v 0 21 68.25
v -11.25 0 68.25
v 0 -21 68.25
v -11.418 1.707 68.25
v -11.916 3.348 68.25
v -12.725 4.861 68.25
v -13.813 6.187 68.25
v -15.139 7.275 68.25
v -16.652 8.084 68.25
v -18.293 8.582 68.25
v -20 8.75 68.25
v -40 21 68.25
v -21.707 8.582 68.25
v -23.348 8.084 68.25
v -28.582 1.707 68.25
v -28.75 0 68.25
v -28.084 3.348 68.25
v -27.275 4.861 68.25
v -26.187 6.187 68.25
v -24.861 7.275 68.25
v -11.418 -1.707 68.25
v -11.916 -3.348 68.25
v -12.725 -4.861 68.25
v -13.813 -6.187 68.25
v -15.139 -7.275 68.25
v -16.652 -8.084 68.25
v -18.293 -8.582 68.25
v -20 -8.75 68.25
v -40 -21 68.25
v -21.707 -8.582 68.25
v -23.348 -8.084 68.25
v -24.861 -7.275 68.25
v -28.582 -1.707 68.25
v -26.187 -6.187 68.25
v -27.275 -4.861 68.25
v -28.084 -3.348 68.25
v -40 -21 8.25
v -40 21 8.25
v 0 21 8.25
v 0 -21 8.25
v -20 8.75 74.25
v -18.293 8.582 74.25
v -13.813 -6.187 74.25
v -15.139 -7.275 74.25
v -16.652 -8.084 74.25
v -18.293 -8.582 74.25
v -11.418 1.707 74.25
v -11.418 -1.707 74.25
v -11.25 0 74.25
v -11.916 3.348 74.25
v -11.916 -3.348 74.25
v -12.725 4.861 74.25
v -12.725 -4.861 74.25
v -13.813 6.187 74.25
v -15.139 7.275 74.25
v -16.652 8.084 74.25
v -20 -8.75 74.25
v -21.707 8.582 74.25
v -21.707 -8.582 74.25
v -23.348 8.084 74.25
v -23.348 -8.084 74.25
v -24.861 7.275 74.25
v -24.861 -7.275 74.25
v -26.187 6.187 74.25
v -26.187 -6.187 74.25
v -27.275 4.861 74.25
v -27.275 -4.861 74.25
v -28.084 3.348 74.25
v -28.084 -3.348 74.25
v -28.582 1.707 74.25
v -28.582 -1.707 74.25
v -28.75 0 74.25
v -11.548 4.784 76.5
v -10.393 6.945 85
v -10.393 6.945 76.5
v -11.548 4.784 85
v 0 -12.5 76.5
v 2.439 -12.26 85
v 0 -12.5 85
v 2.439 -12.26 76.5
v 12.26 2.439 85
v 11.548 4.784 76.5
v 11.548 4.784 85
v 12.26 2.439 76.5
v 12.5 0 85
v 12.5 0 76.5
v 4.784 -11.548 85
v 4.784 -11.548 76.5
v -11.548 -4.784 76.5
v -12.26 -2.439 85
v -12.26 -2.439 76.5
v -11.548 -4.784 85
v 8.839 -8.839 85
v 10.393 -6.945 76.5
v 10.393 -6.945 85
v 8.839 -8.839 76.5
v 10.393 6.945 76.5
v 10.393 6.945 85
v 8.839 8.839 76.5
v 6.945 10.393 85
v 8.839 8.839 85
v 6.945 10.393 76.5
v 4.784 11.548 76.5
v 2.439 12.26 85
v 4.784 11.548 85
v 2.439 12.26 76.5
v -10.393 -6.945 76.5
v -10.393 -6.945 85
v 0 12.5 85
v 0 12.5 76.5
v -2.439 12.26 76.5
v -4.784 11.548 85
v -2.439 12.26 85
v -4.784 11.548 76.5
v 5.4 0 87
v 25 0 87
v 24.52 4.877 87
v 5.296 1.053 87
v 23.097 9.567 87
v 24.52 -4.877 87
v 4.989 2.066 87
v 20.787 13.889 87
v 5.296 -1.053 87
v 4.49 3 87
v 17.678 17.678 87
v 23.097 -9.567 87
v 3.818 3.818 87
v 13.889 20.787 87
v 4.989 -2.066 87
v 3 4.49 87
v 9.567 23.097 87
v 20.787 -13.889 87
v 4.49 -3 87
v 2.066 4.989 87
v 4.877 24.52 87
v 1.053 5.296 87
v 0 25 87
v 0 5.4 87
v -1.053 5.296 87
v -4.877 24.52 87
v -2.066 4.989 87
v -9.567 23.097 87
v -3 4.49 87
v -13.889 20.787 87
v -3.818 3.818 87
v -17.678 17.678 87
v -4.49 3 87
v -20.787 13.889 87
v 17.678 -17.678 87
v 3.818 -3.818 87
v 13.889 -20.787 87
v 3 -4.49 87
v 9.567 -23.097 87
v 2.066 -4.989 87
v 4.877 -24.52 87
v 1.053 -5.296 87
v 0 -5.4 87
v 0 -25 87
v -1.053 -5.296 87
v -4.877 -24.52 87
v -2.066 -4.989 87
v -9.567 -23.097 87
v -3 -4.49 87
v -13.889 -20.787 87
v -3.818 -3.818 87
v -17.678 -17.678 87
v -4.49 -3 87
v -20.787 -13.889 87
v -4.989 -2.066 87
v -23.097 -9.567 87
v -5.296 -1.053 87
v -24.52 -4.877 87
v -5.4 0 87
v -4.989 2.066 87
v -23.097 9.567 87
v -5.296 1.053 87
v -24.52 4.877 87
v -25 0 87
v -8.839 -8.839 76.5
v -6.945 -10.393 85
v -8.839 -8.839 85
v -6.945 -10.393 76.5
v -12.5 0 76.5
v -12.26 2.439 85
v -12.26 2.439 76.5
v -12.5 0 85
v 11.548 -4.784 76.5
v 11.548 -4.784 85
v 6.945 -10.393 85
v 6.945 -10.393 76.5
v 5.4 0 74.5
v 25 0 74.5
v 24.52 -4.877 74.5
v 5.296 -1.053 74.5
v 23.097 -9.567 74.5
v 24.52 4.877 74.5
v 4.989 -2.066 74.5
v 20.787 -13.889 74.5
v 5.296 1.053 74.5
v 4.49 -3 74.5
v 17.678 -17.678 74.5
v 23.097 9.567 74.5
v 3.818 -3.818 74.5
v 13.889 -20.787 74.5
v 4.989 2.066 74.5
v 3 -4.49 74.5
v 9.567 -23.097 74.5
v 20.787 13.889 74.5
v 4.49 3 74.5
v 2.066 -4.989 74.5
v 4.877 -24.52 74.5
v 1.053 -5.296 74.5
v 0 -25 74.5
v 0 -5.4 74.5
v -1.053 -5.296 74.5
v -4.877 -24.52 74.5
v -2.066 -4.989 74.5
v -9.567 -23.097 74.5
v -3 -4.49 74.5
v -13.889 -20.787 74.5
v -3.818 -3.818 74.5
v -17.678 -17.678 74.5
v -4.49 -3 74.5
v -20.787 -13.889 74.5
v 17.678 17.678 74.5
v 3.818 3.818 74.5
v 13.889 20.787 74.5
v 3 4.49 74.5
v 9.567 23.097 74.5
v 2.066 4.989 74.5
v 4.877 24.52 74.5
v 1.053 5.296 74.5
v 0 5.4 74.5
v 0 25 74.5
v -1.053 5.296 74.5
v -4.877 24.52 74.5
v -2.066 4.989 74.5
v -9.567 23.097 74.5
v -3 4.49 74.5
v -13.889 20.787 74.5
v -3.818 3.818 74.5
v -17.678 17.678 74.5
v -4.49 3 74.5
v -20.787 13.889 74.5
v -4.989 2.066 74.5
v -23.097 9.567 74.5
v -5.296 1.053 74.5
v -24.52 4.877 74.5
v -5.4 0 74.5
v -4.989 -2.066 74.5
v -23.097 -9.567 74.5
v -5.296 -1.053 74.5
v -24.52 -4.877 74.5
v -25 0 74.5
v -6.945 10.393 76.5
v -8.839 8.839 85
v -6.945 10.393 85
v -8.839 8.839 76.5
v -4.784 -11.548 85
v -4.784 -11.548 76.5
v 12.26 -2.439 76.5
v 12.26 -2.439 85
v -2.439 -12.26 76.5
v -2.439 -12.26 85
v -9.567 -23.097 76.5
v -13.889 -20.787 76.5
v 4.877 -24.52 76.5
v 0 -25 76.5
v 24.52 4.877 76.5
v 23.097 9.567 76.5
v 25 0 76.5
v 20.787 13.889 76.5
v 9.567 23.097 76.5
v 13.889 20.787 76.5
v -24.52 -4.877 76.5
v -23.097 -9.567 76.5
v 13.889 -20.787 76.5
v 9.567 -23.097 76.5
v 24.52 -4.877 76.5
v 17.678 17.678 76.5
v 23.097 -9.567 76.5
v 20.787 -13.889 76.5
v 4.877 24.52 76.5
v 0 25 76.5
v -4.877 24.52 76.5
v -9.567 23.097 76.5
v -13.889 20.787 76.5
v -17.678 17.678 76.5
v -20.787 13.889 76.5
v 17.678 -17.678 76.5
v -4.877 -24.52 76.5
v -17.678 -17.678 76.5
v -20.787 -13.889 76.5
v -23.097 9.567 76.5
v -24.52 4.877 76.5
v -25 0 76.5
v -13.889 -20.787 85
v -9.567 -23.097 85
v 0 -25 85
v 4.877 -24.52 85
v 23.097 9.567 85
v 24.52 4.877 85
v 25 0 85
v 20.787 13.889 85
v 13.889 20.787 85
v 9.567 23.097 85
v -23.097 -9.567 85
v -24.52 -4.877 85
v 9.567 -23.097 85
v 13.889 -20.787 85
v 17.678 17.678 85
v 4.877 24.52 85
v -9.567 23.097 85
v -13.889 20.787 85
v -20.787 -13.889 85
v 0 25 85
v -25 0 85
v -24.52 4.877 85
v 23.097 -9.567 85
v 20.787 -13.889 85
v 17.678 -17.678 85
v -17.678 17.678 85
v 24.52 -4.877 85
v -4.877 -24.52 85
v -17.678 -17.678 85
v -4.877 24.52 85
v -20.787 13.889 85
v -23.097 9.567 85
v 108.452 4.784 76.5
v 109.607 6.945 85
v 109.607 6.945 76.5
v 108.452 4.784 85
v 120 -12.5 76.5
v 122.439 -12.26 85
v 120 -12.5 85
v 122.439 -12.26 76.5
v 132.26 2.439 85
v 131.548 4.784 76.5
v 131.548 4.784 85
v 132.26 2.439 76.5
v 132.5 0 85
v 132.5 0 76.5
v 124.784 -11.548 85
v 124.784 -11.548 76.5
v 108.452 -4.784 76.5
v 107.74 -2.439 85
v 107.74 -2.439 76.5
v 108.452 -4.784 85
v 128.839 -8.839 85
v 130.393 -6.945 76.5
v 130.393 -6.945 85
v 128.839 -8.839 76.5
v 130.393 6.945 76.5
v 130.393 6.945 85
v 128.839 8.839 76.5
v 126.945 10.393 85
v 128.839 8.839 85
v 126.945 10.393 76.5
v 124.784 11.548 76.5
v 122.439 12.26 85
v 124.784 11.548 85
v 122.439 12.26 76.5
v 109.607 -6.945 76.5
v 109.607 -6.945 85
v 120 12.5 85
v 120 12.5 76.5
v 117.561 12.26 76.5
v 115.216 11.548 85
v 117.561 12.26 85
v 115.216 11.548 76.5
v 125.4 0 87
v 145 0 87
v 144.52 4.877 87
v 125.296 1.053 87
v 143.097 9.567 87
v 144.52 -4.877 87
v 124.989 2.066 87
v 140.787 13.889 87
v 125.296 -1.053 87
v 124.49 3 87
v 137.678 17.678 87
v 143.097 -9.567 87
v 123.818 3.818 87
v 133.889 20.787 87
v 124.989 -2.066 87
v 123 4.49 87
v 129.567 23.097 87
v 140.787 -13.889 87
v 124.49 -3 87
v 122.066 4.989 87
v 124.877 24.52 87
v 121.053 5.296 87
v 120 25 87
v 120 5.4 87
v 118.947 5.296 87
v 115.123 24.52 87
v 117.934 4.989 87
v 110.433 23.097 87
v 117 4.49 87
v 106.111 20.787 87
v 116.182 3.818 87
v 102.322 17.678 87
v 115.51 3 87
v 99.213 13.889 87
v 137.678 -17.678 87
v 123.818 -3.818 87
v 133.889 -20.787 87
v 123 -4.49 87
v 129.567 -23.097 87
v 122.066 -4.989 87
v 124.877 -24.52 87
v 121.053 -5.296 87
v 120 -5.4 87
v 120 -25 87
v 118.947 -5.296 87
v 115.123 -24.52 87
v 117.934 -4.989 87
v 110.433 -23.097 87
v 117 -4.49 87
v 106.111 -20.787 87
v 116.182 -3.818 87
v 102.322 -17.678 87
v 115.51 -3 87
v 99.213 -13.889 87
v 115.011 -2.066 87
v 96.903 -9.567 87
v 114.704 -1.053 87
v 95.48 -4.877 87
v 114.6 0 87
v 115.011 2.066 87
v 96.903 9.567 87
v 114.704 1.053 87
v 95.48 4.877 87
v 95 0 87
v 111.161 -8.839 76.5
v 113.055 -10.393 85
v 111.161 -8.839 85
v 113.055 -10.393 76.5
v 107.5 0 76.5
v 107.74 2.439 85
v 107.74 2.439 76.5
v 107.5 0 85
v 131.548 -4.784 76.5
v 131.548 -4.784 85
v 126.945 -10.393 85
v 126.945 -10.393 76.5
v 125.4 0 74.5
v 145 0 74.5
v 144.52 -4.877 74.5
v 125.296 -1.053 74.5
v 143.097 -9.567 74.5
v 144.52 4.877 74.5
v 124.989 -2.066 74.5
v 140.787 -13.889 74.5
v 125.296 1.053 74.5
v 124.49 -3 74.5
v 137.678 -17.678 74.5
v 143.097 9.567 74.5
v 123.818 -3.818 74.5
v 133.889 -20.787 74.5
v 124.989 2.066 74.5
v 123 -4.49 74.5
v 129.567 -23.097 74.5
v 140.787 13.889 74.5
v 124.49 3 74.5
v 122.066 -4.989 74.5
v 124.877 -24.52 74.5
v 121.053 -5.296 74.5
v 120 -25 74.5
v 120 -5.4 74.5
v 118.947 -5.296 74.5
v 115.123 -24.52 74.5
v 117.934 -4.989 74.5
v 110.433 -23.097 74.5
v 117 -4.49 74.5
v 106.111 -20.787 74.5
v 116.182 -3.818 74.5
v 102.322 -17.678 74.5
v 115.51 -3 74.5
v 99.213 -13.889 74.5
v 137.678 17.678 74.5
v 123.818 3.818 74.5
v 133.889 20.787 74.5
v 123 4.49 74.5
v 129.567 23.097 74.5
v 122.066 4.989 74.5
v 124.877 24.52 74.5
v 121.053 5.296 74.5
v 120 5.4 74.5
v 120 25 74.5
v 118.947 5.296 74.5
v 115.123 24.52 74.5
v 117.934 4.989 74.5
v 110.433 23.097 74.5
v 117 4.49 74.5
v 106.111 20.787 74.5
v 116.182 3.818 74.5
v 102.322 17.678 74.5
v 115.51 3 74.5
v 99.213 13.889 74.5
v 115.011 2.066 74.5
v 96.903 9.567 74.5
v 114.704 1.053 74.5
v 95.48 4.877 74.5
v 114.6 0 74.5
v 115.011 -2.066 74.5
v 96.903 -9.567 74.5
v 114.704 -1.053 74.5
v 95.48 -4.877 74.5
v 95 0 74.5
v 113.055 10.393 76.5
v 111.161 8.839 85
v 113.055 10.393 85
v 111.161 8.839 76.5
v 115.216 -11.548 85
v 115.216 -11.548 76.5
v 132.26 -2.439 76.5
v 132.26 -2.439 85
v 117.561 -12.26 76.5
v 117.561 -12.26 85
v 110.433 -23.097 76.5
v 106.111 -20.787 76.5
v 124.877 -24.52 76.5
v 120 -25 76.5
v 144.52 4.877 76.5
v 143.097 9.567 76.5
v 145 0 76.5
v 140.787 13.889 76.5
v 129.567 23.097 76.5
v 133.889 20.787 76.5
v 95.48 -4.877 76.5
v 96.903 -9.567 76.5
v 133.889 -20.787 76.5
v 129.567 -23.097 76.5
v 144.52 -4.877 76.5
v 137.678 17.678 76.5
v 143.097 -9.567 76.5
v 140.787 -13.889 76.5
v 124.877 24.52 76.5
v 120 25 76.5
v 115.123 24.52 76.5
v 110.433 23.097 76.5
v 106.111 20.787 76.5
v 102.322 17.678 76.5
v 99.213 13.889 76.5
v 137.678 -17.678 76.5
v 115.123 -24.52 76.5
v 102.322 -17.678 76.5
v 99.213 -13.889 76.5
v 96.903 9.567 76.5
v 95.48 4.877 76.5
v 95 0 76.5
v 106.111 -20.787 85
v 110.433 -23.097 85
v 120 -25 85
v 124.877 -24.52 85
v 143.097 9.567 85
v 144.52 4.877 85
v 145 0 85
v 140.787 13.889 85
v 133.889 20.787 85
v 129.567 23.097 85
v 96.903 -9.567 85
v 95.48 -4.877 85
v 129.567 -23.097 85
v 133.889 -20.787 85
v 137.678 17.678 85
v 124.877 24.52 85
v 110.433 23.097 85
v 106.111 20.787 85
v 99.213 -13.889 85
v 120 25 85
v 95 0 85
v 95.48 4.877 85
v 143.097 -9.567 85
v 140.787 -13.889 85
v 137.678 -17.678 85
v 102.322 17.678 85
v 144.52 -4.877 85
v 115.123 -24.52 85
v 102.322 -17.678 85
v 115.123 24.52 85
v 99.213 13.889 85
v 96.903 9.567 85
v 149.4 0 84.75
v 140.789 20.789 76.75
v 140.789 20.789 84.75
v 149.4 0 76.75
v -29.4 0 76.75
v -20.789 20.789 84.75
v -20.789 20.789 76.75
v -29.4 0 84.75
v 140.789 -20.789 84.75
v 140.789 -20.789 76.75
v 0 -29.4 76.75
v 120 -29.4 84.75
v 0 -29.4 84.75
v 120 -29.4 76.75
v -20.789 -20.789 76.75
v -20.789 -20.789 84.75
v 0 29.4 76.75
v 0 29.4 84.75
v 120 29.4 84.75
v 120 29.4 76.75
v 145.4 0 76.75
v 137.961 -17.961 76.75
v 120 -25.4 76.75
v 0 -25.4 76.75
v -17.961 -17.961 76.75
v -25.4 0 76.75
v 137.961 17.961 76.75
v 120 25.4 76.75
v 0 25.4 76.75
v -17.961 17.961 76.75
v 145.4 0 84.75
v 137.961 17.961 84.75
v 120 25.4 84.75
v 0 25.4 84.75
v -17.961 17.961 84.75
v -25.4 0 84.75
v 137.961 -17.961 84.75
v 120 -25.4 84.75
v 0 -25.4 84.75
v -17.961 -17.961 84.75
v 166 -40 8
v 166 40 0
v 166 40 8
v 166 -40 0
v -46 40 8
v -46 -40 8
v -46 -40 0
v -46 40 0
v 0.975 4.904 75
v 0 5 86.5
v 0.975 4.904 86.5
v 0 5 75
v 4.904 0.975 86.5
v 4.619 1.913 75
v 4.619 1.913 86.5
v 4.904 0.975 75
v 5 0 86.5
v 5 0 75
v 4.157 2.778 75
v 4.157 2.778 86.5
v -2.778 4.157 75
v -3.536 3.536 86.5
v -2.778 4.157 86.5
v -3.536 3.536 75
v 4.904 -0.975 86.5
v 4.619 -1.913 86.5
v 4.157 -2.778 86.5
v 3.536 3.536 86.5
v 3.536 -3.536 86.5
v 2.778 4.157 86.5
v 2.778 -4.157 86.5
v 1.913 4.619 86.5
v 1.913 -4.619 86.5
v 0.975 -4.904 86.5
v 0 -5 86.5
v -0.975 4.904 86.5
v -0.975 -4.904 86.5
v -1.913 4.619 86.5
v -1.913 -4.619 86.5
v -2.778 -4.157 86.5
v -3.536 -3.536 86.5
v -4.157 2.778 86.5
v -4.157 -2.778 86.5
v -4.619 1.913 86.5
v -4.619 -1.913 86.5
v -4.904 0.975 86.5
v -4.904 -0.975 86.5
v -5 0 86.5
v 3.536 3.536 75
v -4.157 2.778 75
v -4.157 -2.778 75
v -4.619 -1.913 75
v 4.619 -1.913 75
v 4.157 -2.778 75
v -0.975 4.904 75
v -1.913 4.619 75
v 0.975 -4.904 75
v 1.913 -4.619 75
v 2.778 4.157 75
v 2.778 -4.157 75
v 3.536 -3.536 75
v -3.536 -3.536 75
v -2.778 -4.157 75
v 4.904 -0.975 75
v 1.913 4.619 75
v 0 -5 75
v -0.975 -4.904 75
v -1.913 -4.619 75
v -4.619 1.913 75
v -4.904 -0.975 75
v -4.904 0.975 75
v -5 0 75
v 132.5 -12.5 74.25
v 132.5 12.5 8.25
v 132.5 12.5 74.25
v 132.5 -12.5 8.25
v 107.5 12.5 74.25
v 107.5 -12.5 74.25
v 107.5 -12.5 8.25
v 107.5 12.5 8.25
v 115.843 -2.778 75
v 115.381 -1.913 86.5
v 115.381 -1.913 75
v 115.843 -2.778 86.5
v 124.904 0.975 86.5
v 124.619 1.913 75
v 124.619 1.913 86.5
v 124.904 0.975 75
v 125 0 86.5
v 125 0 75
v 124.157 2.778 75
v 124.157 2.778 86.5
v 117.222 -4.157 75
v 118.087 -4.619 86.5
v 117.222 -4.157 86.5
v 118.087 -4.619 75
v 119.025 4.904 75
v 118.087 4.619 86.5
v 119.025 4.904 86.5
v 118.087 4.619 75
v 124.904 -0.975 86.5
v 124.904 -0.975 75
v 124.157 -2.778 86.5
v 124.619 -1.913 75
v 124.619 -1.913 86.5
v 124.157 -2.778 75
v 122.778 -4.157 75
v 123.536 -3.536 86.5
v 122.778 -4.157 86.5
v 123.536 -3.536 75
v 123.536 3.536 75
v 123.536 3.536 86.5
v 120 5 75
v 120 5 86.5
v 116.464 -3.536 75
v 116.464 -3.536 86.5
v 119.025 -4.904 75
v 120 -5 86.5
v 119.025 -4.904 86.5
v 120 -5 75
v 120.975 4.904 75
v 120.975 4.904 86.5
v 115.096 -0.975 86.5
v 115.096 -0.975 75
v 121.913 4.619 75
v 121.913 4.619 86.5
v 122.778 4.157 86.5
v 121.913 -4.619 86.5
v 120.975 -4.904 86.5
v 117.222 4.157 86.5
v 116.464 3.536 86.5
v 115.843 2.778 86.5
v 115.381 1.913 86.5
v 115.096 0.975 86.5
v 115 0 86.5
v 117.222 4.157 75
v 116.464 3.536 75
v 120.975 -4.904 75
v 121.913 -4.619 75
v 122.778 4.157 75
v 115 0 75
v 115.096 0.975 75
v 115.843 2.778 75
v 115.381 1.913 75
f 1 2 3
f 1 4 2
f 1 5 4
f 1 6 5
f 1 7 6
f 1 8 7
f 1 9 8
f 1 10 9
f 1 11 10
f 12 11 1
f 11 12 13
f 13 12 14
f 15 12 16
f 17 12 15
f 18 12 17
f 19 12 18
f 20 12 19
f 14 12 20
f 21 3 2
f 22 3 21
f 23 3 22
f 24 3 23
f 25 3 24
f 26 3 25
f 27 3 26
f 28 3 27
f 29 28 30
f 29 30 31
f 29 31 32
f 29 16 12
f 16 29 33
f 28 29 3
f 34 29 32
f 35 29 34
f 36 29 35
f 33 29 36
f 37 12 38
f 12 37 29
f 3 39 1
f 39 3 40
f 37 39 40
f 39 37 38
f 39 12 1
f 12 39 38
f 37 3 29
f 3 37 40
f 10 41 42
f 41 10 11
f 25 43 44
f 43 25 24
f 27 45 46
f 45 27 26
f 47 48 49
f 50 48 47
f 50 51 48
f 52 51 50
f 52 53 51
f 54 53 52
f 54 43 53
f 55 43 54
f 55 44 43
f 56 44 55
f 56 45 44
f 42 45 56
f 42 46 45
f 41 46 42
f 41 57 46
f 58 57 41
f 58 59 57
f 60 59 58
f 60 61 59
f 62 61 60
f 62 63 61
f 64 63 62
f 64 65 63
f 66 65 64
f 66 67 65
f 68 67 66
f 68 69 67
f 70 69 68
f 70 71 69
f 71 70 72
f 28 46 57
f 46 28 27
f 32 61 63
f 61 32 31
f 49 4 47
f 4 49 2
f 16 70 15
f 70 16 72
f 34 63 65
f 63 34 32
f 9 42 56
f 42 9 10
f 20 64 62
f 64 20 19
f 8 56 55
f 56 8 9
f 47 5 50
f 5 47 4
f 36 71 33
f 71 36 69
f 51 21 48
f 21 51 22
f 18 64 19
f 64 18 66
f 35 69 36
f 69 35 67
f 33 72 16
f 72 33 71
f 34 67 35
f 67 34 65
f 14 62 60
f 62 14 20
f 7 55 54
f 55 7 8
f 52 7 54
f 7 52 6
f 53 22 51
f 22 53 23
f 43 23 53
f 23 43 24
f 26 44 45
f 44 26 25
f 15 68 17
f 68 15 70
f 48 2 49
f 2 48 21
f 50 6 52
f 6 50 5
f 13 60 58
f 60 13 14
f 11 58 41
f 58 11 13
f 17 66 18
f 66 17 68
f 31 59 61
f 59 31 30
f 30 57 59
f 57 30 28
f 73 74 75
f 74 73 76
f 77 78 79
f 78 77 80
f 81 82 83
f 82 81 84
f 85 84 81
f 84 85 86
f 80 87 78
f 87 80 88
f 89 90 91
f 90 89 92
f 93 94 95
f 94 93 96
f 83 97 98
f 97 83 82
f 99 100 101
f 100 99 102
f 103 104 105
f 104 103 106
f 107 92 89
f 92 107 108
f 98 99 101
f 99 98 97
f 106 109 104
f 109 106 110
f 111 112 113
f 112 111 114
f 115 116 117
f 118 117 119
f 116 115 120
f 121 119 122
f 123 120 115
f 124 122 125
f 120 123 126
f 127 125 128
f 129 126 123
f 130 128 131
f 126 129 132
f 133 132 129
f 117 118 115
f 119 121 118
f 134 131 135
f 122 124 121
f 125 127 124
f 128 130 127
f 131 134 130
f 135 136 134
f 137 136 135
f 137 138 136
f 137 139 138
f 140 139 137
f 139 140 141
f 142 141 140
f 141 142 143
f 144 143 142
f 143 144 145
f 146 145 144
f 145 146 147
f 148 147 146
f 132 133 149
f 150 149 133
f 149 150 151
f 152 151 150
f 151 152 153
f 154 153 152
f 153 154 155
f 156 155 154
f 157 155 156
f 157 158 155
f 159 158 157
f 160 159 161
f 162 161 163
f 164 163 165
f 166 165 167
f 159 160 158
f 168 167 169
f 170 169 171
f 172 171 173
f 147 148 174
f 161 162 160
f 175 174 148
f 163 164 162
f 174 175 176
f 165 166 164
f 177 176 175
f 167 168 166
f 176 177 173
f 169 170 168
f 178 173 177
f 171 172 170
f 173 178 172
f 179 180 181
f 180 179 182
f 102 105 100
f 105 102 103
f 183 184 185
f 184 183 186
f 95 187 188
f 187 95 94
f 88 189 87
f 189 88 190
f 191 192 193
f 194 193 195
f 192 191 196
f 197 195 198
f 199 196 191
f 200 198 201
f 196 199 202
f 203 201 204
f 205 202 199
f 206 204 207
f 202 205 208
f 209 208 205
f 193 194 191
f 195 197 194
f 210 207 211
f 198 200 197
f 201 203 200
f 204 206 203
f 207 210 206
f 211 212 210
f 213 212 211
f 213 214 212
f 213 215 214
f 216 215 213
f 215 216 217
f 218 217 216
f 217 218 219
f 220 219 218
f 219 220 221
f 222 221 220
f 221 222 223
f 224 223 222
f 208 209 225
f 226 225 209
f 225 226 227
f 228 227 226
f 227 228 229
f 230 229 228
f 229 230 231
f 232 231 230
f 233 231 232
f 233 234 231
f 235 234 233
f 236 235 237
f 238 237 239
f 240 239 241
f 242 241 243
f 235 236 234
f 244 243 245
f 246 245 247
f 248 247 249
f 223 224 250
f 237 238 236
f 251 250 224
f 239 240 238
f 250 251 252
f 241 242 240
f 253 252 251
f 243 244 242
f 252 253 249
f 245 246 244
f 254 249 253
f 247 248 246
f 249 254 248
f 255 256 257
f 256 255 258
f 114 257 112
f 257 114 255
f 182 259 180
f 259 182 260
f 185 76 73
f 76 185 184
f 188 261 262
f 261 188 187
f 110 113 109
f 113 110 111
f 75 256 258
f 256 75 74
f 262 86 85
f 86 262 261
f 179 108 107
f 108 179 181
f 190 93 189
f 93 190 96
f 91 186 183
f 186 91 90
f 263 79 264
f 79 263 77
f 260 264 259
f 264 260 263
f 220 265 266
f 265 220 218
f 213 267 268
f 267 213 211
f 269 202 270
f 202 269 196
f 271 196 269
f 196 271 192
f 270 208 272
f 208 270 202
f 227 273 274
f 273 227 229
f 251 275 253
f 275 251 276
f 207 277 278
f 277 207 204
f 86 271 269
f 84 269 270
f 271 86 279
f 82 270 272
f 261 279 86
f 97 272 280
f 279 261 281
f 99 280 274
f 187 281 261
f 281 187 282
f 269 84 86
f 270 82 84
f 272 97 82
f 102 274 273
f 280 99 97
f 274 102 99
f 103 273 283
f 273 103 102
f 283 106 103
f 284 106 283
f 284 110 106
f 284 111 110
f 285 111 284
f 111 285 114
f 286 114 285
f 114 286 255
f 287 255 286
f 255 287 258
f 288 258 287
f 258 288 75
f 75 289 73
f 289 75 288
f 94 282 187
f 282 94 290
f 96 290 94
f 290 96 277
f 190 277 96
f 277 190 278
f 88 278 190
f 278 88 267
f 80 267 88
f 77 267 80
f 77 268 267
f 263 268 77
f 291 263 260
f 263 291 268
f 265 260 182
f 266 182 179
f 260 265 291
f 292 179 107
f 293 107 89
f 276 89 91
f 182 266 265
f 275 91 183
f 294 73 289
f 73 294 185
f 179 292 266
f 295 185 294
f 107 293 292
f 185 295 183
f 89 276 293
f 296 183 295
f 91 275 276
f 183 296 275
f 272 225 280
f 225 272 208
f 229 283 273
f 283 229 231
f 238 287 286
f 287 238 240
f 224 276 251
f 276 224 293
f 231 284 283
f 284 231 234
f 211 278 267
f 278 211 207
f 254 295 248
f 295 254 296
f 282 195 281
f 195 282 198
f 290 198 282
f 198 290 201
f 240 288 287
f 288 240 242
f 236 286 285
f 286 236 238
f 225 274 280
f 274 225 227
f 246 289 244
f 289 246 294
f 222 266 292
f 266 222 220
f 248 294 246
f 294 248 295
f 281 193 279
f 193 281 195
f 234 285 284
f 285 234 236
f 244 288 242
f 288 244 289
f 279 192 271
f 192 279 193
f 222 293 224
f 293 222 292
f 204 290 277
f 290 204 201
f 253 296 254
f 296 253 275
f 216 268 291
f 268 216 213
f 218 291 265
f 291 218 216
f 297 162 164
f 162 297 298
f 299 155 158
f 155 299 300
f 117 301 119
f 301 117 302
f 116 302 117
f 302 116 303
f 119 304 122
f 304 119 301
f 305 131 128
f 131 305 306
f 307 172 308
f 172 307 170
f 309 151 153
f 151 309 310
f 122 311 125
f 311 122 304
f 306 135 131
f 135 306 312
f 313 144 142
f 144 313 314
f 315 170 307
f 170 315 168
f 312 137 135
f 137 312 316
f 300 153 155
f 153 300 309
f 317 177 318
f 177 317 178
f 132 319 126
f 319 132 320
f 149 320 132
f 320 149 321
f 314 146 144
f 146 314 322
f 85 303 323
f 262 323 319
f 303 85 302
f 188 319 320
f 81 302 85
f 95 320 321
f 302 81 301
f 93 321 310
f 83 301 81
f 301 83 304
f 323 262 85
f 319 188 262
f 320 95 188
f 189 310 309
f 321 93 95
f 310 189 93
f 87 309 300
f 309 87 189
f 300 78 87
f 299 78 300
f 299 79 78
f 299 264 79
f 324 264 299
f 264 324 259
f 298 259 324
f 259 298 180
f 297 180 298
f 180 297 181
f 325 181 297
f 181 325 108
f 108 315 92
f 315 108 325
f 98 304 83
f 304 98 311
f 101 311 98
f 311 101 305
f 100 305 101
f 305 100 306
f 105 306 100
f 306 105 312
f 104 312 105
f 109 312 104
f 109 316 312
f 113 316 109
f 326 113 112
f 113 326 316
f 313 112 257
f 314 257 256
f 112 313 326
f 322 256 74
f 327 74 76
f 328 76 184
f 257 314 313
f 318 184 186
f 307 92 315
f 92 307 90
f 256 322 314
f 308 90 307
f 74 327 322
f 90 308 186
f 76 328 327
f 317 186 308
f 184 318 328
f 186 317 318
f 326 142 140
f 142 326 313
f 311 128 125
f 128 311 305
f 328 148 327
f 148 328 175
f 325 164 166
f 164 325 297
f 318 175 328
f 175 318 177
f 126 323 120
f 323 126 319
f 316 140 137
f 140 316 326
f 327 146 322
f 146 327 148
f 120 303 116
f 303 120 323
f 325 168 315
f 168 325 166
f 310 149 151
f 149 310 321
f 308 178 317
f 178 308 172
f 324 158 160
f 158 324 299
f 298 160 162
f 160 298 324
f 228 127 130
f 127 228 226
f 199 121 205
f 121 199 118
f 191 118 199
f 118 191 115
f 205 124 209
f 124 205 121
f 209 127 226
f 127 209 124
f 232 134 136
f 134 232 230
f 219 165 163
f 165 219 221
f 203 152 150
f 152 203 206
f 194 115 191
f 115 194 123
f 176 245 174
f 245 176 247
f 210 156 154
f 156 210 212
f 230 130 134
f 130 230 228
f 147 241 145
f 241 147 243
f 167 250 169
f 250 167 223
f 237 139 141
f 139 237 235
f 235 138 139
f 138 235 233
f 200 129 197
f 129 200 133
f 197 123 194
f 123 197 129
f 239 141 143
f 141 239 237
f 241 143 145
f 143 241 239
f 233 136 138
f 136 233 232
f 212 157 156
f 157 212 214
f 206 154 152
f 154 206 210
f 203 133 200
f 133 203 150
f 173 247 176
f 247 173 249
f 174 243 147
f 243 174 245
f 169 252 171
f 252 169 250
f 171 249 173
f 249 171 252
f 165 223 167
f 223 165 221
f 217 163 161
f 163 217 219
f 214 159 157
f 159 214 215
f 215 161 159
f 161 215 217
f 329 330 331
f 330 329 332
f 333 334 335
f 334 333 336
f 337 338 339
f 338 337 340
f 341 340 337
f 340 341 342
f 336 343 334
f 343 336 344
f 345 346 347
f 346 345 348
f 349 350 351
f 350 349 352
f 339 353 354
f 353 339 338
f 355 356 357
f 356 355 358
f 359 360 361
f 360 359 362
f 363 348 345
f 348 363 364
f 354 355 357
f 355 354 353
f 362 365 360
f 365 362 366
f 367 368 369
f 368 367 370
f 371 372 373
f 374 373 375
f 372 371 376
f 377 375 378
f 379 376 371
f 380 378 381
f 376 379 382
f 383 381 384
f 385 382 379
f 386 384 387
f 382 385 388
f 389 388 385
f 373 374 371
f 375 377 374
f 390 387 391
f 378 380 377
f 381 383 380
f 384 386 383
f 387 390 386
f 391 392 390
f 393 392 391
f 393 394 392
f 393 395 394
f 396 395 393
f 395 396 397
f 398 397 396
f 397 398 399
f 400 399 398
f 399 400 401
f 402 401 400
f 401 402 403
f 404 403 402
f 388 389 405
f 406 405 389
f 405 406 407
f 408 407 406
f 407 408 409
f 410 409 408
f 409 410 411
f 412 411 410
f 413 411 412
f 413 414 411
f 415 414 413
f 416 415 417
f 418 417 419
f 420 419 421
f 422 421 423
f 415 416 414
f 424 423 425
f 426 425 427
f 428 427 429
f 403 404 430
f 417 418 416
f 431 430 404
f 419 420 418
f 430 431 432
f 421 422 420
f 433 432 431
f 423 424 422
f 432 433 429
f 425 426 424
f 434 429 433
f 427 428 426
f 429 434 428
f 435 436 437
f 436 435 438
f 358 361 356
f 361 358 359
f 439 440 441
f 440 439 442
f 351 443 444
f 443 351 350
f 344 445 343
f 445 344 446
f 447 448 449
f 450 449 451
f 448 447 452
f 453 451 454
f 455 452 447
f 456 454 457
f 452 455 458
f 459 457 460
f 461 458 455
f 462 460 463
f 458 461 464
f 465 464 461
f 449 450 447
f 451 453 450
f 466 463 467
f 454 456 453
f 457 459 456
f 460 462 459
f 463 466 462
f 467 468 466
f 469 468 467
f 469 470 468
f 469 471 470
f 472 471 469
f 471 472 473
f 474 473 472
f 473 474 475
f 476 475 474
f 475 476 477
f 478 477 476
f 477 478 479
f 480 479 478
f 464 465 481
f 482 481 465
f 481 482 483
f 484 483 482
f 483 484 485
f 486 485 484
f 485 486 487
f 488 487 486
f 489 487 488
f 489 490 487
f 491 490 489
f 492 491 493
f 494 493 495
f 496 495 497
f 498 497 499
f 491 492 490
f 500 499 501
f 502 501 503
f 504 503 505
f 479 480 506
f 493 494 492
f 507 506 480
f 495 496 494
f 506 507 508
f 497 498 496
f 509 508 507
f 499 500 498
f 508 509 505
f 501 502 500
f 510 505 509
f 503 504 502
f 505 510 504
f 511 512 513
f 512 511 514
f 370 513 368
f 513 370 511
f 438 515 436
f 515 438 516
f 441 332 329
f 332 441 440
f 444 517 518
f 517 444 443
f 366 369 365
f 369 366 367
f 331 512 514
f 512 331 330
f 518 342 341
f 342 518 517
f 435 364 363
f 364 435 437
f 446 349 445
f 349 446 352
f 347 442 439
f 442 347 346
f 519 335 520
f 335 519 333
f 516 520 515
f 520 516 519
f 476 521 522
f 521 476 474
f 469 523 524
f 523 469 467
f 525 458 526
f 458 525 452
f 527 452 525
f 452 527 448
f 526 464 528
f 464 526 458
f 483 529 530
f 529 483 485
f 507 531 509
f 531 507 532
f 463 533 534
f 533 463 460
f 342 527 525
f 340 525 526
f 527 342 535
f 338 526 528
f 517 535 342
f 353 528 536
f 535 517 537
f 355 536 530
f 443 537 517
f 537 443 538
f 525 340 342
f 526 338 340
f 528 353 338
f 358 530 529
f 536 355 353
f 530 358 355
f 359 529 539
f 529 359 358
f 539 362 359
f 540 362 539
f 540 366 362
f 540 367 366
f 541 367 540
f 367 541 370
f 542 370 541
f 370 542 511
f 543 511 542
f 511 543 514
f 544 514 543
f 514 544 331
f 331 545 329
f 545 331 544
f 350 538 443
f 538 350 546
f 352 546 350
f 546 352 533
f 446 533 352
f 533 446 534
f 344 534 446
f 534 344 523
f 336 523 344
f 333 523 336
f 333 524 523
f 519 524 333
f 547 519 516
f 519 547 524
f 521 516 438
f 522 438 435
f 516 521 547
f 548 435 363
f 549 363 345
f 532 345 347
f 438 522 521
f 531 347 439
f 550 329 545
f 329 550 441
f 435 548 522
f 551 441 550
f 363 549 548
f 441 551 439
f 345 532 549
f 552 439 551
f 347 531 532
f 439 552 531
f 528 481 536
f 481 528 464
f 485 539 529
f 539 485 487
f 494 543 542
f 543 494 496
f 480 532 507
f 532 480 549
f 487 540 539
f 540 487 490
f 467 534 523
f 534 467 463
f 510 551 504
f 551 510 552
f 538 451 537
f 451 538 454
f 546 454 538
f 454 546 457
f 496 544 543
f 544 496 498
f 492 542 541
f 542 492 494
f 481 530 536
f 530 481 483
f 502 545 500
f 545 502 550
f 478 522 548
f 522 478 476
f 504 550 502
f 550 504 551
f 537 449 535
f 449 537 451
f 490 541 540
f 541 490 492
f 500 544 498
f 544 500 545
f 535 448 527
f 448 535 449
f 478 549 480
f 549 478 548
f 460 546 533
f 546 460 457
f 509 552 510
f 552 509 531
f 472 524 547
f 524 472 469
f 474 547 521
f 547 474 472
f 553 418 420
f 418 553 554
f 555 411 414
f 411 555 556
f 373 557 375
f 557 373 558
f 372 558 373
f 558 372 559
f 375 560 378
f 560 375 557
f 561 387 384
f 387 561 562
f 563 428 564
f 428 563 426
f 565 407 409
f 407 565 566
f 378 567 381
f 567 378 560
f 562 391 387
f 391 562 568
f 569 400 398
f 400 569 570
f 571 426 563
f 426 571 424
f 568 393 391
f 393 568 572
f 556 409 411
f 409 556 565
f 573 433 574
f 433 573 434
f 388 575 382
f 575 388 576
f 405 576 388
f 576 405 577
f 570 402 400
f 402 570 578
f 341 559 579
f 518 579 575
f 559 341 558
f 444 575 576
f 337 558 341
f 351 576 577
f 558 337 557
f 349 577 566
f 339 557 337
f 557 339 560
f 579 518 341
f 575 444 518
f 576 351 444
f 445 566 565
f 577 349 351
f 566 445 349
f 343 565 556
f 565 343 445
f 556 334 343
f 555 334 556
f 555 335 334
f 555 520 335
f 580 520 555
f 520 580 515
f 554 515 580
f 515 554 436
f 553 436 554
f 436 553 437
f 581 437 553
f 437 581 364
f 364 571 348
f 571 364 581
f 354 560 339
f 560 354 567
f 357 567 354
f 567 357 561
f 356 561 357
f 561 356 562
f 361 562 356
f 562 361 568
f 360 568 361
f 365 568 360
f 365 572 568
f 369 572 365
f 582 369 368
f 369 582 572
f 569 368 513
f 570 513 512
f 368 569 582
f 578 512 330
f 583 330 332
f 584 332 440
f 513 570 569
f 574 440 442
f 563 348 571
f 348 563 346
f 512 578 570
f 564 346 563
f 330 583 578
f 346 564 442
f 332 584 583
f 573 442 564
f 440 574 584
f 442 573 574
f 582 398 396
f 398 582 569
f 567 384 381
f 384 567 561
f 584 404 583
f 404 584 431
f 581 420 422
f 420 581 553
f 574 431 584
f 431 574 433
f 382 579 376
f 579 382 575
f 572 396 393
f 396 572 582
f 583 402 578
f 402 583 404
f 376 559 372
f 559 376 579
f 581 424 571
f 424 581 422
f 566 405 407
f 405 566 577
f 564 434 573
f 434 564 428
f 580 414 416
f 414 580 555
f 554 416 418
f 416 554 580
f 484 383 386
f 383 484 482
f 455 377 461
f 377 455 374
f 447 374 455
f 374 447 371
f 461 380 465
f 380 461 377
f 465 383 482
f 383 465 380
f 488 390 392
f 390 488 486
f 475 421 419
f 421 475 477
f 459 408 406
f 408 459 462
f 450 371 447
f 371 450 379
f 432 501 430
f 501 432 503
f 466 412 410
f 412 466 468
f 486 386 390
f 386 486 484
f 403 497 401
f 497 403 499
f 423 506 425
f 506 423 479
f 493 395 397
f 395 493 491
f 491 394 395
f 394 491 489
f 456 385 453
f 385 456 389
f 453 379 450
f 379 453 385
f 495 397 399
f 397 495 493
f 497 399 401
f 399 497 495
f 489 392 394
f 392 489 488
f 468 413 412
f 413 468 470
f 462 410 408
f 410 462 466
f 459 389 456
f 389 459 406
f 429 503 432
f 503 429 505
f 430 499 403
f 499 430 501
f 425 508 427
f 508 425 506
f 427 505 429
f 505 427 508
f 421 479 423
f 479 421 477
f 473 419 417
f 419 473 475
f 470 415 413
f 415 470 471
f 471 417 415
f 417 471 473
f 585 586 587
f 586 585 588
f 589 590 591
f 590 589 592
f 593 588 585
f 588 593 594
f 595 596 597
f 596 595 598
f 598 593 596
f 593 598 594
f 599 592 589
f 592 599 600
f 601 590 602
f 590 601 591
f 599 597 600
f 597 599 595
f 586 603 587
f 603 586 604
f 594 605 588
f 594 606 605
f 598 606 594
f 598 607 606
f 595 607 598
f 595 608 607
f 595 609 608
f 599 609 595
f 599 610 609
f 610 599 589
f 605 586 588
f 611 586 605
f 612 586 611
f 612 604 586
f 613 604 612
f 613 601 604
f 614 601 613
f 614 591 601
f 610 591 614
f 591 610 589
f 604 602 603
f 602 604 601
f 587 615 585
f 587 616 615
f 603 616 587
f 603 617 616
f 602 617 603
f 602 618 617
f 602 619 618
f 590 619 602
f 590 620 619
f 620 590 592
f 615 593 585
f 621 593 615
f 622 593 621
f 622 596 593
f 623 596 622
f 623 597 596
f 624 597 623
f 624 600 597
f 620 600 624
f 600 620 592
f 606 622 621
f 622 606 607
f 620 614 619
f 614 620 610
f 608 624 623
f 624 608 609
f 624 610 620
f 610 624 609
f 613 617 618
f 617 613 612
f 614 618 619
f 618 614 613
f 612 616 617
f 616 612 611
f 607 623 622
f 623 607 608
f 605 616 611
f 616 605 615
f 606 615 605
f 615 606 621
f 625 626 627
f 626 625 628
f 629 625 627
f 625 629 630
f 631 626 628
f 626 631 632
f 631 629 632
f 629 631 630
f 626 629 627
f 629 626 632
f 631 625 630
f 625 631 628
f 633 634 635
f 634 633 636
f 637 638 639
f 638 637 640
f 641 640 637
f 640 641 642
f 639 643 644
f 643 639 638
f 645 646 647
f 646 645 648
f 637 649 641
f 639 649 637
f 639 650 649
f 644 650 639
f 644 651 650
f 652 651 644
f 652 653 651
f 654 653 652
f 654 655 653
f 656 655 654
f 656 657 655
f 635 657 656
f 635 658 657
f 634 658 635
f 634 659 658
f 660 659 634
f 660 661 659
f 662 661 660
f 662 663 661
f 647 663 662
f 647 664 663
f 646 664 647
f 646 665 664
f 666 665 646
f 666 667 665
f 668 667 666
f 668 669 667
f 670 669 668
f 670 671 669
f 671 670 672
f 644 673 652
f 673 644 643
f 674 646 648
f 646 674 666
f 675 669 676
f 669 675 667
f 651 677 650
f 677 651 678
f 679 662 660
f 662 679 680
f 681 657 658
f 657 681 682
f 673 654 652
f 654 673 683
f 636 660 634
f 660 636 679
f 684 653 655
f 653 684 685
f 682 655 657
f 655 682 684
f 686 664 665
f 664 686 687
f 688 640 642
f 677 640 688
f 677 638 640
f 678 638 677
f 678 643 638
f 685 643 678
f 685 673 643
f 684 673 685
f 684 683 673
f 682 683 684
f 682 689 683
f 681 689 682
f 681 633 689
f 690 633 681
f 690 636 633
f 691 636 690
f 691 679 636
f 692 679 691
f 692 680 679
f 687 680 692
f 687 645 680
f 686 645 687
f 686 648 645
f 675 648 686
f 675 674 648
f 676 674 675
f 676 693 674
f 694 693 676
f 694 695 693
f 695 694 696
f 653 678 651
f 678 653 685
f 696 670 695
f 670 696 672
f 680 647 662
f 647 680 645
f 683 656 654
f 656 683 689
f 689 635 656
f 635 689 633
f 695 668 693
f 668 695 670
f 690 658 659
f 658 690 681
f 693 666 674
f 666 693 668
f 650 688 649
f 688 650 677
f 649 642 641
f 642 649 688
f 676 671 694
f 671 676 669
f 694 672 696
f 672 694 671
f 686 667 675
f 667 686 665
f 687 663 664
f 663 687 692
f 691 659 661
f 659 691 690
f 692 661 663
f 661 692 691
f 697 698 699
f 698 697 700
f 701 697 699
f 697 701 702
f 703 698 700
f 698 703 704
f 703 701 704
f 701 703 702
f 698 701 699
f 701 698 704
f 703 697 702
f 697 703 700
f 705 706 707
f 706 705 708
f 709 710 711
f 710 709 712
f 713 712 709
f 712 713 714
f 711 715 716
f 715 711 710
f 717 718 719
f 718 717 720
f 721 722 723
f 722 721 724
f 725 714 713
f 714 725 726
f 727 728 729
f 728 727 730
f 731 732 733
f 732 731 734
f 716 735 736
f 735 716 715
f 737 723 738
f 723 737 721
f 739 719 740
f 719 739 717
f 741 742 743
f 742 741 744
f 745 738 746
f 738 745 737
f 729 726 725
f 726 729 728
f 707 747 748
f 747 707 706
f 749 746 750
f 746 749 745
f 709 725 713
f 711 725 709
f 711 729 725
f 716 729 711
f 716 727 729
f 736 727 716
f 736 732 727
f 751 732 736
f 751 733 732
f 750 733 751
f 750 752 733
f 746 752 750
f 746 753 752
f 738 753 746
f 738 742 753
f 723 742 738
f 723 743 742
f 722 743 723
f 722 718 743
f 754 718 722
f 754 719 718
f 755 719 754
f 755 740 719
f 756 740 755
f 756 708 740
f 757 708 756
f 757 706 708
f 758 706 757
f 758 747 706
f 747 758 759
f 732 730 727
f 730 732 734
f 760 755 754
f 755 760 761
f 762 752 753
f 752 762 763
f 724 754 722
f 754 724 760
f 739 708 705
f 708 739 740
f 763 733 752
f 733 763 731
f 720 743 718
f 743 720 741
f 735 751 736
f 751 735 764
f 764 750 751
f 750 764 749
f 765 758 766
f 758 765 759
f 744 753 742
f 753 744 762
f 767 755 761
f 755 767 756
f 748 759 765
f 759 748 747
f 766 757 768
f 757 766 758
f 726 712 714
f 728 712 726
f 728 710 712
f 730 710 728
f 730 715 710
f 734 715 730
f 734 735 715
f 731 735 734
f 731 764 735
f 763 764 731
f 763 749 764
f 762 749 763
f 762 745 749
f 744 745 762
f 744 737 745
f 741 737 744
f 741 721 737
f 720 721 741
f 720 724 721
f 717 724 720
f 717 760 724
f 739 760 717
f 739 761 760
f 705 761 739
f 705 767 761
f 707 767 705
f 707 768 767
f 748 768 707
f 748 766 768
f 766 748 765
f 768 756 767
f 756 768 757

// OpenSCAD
$fn = 32;

// ------------------------------------------------------------------------
// Motor belt drive: span 120 mm, pulleys d50, belt 8 mm wide
// Every part is its own module, assembly() places every instance.
// ------------------------------------------------------------------------

// --- part 1 ---
module base_plate() {
  difference() {
    translate([-106, -40, 0]) cube([212, 80, 8]);
  }
}

// --- part 2 ---
module motor() {
  union() {
    translate([-30, -21, 0]) cube([60, 42, 40]);
    translate([33, 0, 20]) rotate([0, 90, 0]) cylinder(h = 6, d = 17.5, center = true);
  }
}

// --- part 3 ---
module drive_shaft() {
  translate([0, 0, -5.75]) cylinder(h = 11.5, d = 10);
}

// --- part 4 ---
module pulley_drive() {
  difference() {
    union() {
      cylinder(h = 12.5, d = 25);
      cylinder(h = 2, d = 50);
      translate([0, 0, 10.5]) cylinder(h = 2, d = 50);
    }
    translate([0, 0, -1]) cylinder(h = 14.5, d = 10.8);
  }
}

// --- part 5 ---
module idler_post() {
  translate([-12.5, -12.5, 0]) cube([25, 25, 66]);
}

// --- part 6 ---
module driven_shaft() {
  translate([0, 0, -5.75]) cylinder(h = 11.5, d = 10);
}

// --- part 7 ---
module pulley_driven() {
  difference() {
    union() {
      cylinder(h = 12.5, d = 25);
      cylinder(h = 2, d = 50);
      translate([0, 0, 10.5]) cylinder(h = 2, d = 50);
    }
    translate([0, 0, -1]) cylinder(h = 14.5, d = 10.8);
  }
}

// --- part 8 ---
module drive_belt() {
  difference() {
    linear_extrude(height = 8) polygon(points = concat([for (a = [90 : 45 : 270]) [29.4 * cos(a), 29.4 * sin(a)]], [for (a = [270 : 45 : 450]) [120 + 29.4 * cos(a), 29.4 * sin(a)]]));
    translate([0, 0, -1]) linear_extrude(height = 10) polygon(points = concat([for (a = [90 : 45 : 270]) [25.4 * cos(a), 25.4 * sin(a)]], [for (a = [270 : 45 : 450]) [120 + 25.4 * cos(a), 25.4 * sin(a)]]));
  }
}

// --- assembly ---
module assembly() {
  color([0.80, 0.24, 0.20]) translate([60, 0, 0]) rotate([0, 0, 0]) base_plate();
  color([0.20, 0.45, 0.75]) translate([0, 0, 38.25]) rotate([0, 270, 0]) motor();
  color([0.25, 0.62, 0.32]) translate([0, 0, 80.75]) rotate([0, 0, 0]) drive_shaft();
  color([0.92, 0.70, 0.18]) translate([0, 0, 74.5]) rotate([0, 0, 0]) pulley_drive();
  color([0.58, 0.35, 0.70]) translate([120, 0, 8.25]) rotate([0, 0, 0]) idler_post();
  color([0.16, 0.66, 0.66]) translate([120, 0, 80.75]) rotate([0, 0, 0]) driven_shaft();
  color([0.85, 0.48, 0.18]) translate([120, 0, 74.5]) rotate([0, 0, 0]) pulley_driven();
  color([0.55, 0.60, 0.65]) translate([0, 0, 76.75]) rotate([0, 0, 0]) drive_belt();
}

assembly();
